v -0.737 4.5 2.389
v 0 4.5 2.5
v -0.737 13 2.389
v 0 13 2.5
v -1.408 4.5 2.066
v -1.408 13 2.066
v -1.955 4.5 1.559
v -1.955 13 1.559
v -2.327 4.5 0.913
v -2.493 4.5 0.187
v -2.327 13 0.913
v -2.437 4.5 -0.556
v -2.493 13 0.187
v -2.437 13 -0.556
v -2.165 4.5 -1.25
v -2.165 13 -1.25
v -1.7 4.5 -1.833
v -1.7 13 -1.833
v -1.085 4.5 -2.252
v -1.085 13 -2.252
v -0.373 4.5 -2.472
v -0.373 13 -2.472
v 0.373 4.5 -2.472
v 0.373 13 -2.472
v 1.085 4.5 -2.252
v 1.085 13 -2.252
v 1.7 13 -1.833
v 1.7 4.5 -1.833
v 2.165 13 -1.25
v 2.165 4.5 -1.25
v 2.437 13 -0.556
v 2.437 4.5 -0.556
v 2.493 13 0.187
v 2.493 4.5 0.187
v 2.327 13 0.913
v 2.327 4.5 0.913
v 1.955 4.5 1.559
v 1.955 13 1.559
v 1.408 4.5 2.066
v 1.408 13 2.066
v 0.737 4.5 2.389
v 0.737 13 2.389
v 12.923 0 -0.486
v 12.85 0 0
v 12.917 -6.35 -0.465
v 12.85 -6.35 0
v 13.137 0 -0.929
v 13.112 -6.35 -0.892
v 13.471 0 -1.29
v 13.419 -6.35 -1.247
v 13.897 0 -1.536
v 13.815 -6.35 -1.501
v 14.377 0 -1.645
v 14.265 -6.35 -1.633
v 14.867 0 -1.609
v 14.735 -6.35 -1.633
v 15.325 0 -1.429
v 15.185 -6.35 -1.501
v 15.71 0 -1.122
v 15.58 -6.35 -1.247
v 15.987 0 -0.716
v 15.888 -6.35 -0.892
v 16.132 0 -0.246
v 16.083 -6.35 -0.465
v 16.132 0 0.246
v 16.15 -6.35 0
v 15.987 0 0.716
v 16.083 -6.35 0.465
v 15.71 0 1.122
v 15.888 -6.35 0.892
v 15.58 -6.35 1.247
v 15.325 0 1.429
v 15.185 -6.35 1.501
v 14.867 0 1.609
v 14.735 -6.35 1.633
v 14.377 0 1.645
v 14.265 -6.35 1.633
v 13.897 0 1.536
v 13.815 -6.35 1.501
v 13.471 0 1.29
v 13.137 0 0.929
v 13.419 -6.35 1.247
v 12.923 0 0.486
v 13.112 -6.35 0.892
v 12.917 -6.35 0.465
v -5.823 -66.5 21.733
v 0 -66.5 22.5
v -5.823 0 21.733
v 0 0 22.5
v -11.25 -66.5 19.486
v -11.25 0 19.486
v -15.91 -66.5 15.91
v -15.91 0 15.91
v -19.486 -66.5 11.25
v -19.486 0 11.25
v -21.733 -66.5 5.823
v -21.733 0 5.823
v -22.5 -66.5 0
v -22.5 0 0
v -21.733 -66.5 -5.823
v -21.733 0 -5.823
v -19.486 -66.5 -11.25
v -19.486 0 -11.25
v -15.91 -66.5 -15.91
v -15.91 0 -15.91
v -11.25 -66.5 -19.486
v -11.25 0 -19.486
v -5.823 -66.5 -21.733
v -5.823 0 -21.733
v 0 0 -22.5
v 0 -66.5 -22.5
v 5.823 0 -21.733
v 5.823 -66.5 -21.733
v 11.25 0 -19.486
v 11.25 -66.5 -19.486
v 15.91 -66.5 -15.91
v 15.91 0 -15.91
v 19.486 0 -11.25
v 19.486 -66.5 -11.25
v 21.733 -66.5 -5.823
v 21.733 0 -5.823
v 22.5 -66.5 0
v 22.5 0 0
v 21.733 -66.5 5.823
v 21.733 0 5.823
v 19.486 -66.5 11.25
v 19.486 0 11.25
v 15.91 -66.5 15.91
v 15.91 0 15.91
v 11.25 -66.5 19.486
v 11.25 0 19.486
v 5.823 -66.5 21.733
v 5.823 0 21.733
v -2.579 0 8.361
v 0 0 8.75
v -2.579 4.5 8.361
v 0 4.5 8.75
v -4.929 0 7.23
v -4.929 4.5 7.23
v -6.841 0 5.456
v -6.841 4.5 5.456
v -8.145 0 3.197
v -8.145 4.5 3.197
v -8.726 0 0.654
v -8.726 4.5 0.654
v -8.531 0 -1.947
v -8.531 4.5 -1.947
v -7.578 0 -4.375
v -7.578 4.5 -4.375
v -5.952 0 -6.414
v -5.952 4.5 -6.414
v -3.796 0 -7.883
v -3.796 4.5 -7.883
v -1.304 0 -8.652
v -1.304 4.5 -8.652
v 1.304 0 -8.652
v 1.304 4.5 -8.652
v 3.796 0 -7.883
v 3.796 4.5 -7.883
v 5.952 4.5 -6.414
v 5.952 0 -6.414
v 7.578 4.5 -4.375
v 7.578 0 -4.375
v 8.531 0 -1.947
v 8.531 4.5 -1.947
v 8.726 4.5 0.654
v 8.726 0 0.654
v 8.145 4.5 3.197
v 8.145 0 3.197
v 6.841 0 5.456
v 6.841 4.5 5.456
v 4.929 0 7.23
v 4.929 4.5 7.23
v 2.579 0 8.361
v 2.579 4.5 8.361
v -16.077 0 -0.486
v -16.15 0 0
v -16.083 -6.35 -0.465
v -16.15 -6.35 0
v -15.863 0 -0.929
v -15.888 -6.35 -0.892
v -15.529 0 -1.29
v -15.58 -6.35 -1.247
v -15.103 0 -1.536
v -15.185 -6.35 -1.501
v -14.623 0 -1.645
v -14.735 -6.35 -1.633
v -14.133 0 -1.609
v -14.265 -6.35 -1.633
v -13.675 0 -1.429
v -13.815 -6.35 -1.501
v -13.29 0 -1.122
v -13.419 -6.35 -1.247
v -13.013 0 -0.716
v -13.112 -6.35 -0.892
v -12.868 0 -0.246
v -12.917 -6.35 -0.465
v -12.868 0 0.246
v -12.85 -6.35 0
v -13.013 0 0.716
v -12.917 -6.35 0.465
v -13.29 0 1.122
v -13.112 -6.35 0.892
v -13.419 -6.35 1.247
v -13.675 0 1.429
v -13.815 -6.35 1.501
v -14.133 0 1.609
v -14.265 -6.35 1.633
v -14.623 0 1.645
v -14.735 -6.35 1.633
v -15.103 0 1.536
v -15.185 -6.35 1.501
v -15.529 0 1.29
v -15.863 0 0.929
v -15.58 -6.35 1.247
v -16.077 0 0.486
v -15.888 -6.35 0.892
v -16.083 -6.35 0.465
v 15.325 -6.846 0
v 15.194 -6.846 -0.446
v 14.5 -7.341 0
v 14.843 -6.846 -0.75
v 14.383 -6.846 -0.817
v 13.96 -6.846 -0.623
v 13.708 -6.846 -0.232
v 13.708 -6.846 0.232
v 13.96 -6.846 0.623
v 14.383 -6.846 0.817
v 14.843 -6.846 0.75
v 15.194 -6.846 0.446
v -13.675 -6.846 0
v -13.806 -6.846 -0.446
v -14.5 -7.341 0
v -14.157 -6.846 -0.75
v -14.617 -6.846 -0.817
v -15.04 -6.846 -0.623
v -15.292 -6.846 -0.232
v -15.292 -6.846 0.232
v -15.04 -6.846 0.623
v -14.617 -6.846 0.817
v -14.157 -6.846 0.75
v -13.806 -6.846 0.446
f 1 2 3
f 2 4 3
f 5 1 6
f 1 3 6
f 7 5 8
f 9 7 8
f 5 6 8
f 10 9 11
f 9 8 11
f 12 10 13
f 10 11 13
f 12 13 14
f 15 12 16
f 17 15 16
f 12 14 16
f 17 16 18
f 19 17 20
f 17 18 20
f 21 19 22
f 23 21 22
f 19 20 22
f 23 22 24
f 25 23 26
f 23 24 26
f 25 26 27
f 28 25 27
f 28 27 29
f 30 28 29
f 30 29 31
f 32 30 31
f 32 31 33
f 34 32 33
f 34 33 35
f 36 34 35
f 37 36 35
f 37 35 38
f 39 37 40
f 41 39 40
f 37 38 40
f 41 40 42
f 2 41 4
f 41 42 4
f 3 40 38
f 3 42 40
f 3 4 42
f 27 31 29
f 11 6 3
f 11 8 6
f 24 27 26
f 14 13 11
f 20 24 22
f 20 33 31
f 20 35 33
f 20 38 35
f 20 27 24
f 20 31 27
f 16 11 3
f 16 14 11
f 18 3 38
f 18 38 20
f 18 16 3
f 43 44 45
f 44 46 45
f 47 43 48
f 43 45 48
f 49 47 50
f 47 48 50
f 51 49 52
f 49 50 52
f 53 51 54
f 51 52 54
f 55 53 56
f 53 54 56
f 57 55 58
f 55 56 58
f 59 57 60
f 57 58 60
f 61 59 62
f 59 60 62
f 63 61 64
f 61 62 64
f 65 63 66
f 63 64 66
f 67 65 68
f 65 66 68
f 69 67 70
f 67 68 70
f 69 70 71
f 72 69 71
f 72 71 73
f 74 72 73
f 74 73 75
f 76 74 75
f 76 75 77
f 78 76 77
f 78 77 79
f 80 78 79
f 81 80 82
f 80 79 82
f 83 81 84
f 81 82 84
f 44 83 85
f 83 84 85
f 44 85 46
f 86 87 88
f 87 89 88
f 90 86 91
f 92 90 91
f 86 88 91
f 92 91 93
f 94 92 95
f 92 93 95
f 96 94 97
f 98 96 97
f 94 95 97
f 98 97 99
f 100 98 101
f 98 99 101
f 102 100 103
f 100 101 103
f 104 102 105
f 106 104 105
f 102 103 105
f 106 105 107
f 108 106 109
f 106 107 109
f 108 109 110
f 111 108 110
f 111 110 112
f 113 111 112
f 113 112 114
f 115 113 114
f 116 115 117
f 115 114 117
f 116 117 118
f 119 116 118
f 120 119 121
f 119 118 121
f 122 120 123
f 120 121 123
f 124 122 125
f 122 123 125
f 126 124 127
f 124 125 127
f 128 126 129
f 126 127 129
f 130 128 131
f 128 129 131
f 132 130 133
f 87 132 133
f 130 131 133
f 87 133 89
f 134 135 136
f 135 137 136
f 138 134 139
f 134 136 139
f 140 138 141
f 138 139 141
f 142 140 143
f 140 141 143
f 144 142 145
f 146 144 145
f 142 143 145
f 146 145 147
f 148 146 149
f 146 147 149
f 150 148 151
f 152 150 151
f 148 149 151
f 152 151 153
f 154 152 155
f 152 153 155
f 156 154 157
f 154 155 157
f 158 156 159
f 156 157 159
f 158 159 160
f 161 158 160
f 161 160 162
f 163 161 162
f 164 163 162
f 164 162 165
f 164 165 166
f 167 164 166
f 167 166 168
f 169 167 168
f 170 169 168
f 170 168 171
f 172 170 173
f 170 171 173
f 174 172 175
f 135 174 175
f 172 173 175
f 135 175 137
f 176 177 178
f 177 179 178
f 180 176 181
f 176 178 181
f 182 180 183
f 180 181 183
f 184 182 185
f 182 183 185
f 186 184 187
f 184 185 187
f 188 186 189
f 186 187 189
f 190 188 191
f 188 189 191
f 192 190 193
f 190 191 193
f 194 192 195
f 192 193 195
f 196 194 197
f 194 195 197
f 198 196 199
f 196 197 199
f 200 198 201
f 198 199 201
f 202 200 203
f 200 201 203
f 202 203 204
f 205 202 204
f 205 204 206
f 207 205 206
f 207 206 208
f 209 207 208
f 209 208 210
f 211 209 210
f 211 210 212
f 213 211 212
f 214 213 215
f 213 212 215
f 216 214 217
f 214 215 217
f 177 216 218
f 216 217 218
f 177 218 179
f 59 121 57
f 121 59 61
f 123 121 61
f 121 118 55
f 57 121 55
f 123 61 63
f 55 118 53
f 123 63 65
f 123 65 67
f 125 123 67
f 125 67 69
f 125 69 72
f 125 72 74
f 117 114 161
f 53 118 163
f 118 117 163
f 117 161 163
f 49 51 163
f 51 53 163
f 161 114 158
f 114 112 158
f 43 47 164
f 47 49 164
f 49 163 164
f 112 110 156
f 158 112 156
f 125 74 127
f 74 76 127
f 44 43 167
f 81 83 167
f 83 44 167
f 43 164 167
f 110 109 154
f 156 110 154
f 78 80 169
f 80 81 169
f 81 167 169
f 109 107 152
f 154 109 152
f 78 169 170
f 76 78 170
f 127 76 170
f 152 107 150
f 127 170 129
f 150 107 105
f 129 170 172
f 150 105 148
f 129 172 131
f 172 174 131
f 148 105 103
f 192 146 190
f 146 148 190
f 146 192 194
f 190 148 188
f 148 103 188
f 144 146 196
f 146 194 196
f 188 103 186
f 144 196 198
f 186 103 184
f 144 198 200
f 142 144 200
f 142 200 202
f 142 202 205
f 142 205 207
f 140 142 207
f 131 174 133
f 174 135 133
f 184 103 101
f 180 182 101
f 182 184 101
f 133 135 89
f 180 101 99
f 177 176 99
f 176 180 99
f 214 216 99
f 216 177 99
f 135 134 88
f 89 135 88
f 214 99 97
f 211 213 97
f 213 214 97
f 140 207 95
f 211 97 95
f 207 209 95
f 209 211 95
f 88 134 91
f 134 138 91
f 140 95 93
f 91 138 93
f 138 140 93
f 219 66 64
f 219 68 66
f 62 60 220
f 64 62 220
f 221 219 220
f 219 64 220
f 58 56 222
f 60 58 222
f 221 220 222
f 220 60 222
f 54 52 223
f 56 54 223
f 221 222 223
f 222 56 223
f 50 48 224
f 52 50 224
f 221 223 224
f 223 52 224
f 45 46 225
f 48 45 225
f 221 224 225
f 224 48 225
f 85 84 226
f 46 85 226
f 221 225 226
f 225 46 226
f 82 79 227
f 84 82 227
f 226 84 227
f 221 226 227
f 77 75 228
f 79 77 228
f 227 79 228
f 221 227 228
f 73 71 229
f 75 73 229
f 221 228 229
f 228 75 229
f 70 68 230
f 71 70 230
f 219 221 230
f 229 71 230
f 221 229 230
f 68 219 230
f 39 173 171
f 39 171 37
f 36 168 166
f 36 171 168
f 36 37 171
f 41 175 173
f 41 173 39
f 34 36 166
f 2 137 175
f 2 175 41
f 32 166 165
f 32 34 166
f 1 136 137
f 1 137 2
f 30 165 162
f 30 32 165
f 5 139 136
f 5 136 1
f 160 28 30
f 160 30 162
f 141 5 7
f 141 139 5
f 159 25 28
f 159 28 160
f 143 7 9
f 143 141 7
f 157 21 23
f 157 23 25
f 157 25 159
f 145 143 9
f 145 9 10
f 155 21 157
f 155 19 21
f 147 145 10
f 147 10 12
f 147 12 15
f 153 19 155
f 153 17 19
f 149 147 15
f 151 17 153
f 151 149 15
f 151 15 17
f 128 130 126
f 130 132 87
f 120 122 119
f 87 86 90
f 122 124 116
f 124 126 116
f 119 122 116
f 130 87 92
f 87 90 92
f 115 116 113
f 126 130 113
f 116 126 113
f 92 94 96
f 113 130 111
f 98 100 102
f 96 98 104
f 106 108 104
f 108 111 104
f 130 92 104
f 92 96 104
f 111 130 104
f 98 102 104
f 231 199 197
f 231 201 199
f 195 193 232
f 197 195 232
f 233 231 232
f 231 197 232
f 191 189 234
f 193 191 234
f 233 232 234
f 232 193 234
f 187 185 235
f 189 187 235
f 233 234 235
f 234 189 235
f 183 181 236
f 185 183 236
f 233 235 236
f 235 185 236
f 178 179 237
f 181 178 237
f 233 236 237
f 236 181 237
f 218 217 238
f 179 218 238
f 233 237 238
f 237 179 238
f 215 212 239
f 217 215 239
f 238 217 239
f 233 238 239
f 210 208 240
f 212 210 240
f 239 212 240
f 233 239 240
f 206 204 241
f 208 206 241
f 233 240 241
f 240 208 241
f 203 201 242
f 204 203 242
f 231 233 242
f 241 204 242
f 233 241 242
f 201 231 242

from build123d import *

# Parameters (mm, degrees)
SKETCH1_W                       = 2.499995
SKETCH1_H                       = 8.5000084
SKETCH1_W_2                     = 8.75000028
SKETCH1_H_2                     = 4.499991
TAP_DRILL_FOR_M4X0_7_TAP1_D     = 3.3
TAP_DRILL_FOR_M4X0_7_TAP1_DEPTH = 6.35
TAP_DRILL_FOR_M4X0_7_TAP1_TIP   = 0.991420021


with BuildPart() as part:
    # Sketch1 → Revolve1 (revolve)
    with BuildSketch(Plane.XY, mode=Mode.PRIVATE) as revolve1_sk:
        Polygon((8.75000028, 0), (0, 0), (0, -66.499994), (22.499955, -66.499994), (22.499955, 0), align=None)
        with Locations((1.2499975, 8.7499952)):
            Rectangle(SKETCH1_W, SKETCH1_H)
        with Locations((4.37500014, 2.2499955)):
            Rectangle(SKETCH1_W_2, SKETCH1_H_2)
    revolve(revolve1_sk.sketch.rotate(Axis((0, 8.775492653, 0), (0, -1, 0)), 90), axis=Axis((0, 8.775492653, 0), (0, -1, 0)))

    # Tap Drill for M4x0.7 Tap1
    with Locations(Plane(origin=(0, 0, 0), x_dir=(1, 0, 0), z_dir=(0, 1, 0))):
        with Locations((-14.499971, 0), (14.499971, 0)):
            Hole(TAP_DRILL_FOR_M4X0_7_TAP1_D / 2, depth=TAP_DRILL_FOR_M4X0_7_TAP1_DEPTH)
            with Locations((0, 0, -(TAP_DRILL_FOR_M4X0_7_TAP1_DEPTH + TAP_DRILL_FOR_M4X0_7_TAP1_TIP / 2))):  # 118° drill point
                Cone(0, TAP_DRILL_FOR_M4X0_7_TAP1_D / 2, TAP_DRILL_FOR_M4X0_7_TAP1_TIP, mode=Mode.SUBTRACT)


solid = part.part
